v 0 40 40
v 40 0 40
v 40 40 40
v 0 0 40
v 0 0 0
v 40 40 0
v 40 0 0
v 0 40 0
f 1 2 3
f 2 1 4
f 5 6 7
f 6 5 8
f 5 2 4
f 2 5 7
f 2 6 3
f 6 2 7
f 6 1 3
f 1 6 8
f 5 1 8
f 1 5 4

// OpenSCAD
// Unsaved Native Agent acceptance buffer
width=40;
cube(width);
